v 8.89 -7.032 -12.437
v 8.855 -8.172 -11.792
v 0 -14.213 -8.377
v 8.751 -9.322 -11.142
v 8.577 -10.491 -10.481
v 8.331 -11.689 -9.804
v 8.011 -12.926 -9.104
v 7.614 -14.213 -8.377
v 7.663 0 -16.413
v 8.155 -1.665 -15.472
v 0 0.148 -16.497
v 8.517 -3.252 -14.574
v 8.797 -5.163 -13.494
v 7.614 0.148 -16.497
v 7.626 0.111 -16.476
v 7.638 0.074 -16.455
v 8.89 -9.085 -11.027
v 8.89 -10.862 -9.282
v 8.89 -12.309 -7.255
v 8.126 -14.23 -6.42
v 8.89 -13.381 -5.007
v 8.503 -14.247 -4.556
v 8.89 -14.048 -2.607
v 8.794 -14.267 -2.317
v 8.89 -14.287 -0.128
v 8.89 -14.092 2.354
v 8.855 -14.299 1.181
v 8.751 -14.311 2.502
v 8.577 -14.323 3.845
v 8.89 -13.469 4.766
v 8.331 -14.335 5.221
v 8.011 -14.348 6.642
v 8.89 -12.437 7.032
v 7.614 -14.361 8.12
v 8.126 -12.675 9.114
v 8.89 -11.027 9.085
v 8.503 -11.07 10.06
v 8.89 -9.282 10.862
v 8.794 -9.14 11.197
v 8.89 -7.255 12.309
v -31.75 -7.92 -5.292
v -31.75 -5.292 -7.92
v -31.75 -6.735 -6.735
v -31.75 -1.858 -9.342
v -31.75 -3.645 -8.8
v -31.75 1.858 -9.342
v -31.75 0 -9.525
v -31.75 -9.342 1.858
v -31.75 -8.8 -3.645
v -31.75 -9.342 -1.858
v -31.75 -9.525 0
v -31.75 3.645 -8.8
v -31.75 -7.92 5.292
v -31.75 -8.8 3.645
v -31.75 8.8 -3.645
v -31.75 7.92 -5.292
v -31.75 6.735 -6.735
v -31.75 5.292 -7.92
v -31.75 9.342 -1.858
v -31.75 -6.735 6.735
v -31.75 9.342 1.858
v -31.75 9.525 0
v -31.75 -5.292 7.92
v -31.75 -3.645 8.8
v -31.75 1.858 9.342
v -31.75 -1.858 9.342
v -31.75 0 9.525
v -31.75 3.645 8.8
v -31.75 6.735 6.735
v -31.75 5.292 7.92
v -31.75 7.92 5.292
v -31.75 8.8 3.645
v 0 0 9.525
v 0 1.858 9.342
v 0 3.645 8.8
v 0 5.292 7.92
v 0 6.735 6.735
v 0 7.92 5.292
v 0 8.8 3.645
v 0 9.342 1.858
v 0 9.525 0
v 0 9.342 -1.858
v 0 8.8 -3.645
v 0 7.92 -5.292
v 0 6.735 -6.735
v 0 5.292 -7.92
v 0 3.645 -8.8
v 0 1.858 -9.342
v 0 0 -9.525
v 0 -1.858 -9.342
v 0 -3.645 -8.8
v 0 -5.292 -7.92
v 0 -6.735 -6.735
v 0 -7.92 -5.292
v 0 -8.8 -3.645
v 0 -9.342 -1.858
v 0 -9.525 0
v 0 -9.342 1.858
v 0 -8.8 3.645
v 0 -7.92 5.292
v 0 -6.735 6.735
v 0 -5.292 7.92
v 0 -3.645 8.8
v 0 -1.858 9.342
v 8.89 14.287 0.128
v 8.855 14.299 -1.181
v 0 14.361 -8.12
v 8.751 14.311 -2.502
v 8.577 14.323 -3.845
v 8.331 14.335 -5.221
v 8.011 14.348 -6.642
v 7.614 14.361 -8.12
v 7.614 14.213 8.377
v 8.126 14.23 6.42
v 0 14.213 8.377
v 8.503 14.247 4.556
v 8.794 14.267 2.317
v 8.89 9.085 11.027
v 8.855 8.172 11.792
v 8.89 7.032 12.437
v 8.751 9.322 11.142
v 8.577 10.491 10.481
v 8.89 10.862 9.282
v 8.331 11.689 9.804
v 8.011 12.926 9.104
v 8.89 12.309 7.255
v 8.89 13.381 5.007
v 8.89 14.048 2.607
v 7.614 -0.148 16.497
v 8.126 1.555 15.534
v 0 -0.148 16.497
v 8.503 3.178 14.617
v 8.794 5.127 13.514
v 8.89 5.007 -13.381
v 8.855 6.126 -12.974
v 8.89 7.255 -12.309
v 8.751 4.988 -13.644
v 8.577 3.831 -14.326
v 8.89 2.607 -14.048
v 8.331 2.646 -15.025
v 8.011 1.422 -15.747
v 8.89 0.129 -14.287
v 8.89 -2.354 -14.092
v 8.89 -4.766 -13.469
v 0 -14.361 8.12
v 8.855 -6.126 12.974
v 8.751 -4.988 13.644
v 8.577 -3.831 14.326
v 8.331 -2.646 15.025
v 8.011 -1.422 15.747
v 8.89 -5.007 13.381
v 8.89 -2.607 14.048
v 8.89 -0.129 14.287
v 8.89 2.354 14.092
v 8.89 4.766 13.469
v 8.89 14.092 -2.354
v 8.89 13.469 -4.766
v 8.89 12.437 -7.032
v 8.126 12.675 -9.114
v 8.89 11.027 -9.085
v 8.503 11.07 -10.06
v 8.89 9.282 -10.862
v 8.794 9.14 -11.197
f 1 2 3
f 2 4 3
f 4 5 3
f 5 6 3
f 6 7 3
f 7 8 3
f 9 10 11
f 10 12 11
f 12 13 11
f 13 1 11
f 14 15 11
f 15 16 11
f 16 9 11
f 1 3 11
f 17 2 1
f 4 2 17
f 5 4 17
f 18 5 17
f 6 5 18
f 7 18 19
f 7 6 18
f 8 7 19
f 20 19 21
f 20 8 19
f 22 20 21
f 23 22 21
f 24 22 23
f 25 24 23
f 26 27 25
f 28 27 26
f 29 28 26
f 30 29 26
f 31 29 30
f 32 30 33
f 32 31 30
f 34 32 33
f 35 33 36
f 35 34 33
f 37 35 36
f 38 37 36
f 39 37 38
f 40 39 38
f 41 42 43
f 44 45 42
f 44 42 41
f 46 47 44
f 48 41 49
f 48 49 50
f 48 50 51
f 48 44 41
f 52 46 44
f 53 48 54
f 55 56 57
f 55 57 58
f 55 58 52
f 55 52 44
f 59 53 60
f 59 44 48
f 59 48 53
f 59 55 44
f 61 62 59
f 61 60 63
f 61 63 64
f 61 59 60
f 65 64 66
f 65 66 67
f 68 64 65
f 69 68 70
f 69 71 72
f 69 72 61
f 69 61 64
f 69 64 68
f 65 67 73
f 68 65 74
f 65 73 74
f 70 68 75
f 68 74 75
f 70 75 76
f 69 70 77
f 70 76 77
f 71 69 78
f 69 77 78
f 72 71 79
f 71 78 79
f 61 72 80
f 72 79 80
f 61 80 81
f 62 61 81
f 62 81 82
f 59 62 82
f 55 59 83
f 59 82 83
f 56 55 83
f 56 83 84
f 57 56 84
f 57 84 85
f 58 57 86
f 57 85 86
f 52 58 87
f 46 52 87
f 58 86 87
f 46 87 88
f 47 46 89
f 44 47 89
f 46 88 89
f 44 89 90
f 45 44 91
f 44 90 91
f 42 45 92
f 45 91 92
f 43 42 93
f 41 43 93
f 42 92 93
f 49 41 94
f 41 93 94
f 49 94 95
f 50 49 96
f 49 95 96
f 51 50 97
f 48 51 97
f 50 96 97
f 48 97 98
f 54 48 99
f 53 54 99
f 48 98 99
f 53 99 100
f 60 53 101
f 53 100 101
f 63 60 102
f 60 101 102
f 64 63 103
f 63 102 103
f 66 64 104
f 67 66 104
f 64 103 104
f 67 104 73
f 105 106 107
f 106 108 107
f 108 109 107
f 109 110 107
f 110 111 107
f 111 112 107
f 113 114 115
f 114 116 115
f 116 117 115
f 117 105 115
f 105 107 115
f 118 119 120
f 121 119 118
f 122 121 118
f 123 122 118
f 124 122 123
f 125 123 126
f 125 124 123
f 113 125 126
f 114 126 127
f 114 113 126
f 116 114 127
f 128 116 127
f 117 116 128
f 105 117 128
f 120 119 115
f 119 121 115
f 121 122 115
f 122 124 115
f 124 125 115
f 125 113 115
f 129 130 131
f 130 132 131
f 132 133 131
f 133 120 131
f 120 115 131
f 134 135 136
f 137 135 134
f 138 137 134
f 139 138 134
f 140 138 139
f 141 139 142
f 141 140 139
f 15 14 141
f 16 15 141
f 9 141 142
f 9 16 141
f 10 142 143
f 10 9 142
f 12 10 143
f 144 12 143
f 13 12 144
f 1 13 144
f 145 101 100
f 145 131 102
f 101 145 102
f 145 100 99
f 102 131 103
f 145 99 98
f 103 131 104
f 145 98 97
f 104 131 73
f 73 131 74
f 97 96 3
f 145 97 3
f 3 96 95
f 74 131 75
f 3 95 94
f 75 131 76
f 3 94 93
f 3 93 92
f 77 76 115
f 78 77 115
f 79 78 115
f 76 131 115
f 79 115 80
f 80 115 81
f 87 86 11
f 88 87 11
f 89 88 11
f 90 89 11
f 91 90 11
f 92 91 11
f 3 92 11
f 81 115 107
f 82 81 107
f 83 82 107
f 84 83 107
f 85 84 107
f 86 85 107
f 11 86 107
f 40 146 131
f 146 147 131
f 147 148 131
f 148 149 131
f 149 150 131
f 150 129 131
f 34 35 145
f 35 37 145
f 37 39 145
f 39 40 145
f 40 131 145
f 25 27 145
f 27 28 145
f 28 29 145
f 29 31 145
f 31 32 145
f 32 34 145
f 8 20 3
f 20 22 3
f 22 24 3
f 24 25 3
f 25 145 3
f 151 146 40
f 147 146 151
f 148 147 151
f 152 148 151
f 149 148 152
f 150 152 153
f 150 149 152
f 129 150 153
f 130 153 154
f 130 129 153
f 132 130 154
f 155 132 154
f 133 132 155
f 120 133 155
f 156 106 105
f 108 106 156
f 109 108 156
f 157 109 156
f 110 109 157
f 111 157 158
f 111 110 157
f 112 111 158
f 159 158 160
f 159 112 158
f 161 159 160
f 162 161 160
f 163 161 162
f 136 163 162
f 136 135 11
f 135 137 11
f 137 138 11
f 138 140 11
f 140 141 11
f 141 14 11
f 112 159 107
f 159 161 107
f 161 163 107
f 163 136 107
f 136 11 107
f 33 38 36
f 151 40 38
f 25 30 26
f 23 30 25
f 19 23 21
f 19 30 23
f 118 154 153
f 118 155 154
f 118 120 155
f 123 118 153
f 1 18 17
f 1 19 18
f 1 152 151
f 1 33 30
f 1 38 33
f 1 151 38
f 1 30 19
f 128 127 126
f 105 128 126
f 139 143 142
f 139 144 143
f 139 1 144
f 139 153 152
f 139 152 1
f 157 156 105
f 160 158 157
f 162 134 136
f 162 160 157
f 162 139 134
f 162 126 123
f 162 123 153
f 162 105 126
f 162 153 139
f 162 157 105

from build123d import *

# Parameters (mm, degrees)
BOSS_EXTRUDE1_DEPTH = 8.89
SKETCH2_OUTSIDE_W   = 61.52
SKETCH2_OUTSIDE_H   = 57.248
SKETCH2_OUTSIDE_R   = 14.2875
CUT_EXTRUDE1_DEPTH  = 5.08
CUT_EXTRUDE1_TAPER  = 60
SKETCH3_R           = 9.525
BOSS_EXTRUDE2_DEPTH = 31.75


with BuildPart() as part:
    # Sketch1 → Boss-Extrude1 (new body)
    with BuildSketch(Plane(origin=(0, 0, 0), x_dir=(0, 0, -1), z_dir=(1, 0, 0))):
        Polygon((8.377045531, -14.212740171), (16.497116811, 0.148364153), (8.12007128, 14.361104324), (-8.377045531, 14.212740171), (-16.497116811, -0.148364153), (-8.12007128, -14.361104324), align=None)
    extrude(amount=BOSS_EXTRUDE1_DEPTH)

    # Sketch2 outside → Cut-Extrude1 (cut)
    with BuildSketch(Plane(origin=(8.89, 0, 0), x_dir=(0, 0, -1), z_dir=(1, 0, 0))):
        Rectangle(SKETCH2_OUTSIDE_W, SKETCH2_OUTSIDE_H)
        Circle(SKETCH2_OUTSIDE_R, mode=Mode.SUBTRACT)
    extrude(amount=-CUT_EXTRUDE1_DEPTH, taper=CUT_EXTRUDE1_TAPER, mode=Mode.SUBTRACT)

    # Sketch3 → Boss-Extrude2 (add)
    with BuildSketch(Plane.ZY):
        Circle(SKETCH3_R)
    extrude(amount=BOSS_EXTRUDE2_DEPTH)


solid = part.part
